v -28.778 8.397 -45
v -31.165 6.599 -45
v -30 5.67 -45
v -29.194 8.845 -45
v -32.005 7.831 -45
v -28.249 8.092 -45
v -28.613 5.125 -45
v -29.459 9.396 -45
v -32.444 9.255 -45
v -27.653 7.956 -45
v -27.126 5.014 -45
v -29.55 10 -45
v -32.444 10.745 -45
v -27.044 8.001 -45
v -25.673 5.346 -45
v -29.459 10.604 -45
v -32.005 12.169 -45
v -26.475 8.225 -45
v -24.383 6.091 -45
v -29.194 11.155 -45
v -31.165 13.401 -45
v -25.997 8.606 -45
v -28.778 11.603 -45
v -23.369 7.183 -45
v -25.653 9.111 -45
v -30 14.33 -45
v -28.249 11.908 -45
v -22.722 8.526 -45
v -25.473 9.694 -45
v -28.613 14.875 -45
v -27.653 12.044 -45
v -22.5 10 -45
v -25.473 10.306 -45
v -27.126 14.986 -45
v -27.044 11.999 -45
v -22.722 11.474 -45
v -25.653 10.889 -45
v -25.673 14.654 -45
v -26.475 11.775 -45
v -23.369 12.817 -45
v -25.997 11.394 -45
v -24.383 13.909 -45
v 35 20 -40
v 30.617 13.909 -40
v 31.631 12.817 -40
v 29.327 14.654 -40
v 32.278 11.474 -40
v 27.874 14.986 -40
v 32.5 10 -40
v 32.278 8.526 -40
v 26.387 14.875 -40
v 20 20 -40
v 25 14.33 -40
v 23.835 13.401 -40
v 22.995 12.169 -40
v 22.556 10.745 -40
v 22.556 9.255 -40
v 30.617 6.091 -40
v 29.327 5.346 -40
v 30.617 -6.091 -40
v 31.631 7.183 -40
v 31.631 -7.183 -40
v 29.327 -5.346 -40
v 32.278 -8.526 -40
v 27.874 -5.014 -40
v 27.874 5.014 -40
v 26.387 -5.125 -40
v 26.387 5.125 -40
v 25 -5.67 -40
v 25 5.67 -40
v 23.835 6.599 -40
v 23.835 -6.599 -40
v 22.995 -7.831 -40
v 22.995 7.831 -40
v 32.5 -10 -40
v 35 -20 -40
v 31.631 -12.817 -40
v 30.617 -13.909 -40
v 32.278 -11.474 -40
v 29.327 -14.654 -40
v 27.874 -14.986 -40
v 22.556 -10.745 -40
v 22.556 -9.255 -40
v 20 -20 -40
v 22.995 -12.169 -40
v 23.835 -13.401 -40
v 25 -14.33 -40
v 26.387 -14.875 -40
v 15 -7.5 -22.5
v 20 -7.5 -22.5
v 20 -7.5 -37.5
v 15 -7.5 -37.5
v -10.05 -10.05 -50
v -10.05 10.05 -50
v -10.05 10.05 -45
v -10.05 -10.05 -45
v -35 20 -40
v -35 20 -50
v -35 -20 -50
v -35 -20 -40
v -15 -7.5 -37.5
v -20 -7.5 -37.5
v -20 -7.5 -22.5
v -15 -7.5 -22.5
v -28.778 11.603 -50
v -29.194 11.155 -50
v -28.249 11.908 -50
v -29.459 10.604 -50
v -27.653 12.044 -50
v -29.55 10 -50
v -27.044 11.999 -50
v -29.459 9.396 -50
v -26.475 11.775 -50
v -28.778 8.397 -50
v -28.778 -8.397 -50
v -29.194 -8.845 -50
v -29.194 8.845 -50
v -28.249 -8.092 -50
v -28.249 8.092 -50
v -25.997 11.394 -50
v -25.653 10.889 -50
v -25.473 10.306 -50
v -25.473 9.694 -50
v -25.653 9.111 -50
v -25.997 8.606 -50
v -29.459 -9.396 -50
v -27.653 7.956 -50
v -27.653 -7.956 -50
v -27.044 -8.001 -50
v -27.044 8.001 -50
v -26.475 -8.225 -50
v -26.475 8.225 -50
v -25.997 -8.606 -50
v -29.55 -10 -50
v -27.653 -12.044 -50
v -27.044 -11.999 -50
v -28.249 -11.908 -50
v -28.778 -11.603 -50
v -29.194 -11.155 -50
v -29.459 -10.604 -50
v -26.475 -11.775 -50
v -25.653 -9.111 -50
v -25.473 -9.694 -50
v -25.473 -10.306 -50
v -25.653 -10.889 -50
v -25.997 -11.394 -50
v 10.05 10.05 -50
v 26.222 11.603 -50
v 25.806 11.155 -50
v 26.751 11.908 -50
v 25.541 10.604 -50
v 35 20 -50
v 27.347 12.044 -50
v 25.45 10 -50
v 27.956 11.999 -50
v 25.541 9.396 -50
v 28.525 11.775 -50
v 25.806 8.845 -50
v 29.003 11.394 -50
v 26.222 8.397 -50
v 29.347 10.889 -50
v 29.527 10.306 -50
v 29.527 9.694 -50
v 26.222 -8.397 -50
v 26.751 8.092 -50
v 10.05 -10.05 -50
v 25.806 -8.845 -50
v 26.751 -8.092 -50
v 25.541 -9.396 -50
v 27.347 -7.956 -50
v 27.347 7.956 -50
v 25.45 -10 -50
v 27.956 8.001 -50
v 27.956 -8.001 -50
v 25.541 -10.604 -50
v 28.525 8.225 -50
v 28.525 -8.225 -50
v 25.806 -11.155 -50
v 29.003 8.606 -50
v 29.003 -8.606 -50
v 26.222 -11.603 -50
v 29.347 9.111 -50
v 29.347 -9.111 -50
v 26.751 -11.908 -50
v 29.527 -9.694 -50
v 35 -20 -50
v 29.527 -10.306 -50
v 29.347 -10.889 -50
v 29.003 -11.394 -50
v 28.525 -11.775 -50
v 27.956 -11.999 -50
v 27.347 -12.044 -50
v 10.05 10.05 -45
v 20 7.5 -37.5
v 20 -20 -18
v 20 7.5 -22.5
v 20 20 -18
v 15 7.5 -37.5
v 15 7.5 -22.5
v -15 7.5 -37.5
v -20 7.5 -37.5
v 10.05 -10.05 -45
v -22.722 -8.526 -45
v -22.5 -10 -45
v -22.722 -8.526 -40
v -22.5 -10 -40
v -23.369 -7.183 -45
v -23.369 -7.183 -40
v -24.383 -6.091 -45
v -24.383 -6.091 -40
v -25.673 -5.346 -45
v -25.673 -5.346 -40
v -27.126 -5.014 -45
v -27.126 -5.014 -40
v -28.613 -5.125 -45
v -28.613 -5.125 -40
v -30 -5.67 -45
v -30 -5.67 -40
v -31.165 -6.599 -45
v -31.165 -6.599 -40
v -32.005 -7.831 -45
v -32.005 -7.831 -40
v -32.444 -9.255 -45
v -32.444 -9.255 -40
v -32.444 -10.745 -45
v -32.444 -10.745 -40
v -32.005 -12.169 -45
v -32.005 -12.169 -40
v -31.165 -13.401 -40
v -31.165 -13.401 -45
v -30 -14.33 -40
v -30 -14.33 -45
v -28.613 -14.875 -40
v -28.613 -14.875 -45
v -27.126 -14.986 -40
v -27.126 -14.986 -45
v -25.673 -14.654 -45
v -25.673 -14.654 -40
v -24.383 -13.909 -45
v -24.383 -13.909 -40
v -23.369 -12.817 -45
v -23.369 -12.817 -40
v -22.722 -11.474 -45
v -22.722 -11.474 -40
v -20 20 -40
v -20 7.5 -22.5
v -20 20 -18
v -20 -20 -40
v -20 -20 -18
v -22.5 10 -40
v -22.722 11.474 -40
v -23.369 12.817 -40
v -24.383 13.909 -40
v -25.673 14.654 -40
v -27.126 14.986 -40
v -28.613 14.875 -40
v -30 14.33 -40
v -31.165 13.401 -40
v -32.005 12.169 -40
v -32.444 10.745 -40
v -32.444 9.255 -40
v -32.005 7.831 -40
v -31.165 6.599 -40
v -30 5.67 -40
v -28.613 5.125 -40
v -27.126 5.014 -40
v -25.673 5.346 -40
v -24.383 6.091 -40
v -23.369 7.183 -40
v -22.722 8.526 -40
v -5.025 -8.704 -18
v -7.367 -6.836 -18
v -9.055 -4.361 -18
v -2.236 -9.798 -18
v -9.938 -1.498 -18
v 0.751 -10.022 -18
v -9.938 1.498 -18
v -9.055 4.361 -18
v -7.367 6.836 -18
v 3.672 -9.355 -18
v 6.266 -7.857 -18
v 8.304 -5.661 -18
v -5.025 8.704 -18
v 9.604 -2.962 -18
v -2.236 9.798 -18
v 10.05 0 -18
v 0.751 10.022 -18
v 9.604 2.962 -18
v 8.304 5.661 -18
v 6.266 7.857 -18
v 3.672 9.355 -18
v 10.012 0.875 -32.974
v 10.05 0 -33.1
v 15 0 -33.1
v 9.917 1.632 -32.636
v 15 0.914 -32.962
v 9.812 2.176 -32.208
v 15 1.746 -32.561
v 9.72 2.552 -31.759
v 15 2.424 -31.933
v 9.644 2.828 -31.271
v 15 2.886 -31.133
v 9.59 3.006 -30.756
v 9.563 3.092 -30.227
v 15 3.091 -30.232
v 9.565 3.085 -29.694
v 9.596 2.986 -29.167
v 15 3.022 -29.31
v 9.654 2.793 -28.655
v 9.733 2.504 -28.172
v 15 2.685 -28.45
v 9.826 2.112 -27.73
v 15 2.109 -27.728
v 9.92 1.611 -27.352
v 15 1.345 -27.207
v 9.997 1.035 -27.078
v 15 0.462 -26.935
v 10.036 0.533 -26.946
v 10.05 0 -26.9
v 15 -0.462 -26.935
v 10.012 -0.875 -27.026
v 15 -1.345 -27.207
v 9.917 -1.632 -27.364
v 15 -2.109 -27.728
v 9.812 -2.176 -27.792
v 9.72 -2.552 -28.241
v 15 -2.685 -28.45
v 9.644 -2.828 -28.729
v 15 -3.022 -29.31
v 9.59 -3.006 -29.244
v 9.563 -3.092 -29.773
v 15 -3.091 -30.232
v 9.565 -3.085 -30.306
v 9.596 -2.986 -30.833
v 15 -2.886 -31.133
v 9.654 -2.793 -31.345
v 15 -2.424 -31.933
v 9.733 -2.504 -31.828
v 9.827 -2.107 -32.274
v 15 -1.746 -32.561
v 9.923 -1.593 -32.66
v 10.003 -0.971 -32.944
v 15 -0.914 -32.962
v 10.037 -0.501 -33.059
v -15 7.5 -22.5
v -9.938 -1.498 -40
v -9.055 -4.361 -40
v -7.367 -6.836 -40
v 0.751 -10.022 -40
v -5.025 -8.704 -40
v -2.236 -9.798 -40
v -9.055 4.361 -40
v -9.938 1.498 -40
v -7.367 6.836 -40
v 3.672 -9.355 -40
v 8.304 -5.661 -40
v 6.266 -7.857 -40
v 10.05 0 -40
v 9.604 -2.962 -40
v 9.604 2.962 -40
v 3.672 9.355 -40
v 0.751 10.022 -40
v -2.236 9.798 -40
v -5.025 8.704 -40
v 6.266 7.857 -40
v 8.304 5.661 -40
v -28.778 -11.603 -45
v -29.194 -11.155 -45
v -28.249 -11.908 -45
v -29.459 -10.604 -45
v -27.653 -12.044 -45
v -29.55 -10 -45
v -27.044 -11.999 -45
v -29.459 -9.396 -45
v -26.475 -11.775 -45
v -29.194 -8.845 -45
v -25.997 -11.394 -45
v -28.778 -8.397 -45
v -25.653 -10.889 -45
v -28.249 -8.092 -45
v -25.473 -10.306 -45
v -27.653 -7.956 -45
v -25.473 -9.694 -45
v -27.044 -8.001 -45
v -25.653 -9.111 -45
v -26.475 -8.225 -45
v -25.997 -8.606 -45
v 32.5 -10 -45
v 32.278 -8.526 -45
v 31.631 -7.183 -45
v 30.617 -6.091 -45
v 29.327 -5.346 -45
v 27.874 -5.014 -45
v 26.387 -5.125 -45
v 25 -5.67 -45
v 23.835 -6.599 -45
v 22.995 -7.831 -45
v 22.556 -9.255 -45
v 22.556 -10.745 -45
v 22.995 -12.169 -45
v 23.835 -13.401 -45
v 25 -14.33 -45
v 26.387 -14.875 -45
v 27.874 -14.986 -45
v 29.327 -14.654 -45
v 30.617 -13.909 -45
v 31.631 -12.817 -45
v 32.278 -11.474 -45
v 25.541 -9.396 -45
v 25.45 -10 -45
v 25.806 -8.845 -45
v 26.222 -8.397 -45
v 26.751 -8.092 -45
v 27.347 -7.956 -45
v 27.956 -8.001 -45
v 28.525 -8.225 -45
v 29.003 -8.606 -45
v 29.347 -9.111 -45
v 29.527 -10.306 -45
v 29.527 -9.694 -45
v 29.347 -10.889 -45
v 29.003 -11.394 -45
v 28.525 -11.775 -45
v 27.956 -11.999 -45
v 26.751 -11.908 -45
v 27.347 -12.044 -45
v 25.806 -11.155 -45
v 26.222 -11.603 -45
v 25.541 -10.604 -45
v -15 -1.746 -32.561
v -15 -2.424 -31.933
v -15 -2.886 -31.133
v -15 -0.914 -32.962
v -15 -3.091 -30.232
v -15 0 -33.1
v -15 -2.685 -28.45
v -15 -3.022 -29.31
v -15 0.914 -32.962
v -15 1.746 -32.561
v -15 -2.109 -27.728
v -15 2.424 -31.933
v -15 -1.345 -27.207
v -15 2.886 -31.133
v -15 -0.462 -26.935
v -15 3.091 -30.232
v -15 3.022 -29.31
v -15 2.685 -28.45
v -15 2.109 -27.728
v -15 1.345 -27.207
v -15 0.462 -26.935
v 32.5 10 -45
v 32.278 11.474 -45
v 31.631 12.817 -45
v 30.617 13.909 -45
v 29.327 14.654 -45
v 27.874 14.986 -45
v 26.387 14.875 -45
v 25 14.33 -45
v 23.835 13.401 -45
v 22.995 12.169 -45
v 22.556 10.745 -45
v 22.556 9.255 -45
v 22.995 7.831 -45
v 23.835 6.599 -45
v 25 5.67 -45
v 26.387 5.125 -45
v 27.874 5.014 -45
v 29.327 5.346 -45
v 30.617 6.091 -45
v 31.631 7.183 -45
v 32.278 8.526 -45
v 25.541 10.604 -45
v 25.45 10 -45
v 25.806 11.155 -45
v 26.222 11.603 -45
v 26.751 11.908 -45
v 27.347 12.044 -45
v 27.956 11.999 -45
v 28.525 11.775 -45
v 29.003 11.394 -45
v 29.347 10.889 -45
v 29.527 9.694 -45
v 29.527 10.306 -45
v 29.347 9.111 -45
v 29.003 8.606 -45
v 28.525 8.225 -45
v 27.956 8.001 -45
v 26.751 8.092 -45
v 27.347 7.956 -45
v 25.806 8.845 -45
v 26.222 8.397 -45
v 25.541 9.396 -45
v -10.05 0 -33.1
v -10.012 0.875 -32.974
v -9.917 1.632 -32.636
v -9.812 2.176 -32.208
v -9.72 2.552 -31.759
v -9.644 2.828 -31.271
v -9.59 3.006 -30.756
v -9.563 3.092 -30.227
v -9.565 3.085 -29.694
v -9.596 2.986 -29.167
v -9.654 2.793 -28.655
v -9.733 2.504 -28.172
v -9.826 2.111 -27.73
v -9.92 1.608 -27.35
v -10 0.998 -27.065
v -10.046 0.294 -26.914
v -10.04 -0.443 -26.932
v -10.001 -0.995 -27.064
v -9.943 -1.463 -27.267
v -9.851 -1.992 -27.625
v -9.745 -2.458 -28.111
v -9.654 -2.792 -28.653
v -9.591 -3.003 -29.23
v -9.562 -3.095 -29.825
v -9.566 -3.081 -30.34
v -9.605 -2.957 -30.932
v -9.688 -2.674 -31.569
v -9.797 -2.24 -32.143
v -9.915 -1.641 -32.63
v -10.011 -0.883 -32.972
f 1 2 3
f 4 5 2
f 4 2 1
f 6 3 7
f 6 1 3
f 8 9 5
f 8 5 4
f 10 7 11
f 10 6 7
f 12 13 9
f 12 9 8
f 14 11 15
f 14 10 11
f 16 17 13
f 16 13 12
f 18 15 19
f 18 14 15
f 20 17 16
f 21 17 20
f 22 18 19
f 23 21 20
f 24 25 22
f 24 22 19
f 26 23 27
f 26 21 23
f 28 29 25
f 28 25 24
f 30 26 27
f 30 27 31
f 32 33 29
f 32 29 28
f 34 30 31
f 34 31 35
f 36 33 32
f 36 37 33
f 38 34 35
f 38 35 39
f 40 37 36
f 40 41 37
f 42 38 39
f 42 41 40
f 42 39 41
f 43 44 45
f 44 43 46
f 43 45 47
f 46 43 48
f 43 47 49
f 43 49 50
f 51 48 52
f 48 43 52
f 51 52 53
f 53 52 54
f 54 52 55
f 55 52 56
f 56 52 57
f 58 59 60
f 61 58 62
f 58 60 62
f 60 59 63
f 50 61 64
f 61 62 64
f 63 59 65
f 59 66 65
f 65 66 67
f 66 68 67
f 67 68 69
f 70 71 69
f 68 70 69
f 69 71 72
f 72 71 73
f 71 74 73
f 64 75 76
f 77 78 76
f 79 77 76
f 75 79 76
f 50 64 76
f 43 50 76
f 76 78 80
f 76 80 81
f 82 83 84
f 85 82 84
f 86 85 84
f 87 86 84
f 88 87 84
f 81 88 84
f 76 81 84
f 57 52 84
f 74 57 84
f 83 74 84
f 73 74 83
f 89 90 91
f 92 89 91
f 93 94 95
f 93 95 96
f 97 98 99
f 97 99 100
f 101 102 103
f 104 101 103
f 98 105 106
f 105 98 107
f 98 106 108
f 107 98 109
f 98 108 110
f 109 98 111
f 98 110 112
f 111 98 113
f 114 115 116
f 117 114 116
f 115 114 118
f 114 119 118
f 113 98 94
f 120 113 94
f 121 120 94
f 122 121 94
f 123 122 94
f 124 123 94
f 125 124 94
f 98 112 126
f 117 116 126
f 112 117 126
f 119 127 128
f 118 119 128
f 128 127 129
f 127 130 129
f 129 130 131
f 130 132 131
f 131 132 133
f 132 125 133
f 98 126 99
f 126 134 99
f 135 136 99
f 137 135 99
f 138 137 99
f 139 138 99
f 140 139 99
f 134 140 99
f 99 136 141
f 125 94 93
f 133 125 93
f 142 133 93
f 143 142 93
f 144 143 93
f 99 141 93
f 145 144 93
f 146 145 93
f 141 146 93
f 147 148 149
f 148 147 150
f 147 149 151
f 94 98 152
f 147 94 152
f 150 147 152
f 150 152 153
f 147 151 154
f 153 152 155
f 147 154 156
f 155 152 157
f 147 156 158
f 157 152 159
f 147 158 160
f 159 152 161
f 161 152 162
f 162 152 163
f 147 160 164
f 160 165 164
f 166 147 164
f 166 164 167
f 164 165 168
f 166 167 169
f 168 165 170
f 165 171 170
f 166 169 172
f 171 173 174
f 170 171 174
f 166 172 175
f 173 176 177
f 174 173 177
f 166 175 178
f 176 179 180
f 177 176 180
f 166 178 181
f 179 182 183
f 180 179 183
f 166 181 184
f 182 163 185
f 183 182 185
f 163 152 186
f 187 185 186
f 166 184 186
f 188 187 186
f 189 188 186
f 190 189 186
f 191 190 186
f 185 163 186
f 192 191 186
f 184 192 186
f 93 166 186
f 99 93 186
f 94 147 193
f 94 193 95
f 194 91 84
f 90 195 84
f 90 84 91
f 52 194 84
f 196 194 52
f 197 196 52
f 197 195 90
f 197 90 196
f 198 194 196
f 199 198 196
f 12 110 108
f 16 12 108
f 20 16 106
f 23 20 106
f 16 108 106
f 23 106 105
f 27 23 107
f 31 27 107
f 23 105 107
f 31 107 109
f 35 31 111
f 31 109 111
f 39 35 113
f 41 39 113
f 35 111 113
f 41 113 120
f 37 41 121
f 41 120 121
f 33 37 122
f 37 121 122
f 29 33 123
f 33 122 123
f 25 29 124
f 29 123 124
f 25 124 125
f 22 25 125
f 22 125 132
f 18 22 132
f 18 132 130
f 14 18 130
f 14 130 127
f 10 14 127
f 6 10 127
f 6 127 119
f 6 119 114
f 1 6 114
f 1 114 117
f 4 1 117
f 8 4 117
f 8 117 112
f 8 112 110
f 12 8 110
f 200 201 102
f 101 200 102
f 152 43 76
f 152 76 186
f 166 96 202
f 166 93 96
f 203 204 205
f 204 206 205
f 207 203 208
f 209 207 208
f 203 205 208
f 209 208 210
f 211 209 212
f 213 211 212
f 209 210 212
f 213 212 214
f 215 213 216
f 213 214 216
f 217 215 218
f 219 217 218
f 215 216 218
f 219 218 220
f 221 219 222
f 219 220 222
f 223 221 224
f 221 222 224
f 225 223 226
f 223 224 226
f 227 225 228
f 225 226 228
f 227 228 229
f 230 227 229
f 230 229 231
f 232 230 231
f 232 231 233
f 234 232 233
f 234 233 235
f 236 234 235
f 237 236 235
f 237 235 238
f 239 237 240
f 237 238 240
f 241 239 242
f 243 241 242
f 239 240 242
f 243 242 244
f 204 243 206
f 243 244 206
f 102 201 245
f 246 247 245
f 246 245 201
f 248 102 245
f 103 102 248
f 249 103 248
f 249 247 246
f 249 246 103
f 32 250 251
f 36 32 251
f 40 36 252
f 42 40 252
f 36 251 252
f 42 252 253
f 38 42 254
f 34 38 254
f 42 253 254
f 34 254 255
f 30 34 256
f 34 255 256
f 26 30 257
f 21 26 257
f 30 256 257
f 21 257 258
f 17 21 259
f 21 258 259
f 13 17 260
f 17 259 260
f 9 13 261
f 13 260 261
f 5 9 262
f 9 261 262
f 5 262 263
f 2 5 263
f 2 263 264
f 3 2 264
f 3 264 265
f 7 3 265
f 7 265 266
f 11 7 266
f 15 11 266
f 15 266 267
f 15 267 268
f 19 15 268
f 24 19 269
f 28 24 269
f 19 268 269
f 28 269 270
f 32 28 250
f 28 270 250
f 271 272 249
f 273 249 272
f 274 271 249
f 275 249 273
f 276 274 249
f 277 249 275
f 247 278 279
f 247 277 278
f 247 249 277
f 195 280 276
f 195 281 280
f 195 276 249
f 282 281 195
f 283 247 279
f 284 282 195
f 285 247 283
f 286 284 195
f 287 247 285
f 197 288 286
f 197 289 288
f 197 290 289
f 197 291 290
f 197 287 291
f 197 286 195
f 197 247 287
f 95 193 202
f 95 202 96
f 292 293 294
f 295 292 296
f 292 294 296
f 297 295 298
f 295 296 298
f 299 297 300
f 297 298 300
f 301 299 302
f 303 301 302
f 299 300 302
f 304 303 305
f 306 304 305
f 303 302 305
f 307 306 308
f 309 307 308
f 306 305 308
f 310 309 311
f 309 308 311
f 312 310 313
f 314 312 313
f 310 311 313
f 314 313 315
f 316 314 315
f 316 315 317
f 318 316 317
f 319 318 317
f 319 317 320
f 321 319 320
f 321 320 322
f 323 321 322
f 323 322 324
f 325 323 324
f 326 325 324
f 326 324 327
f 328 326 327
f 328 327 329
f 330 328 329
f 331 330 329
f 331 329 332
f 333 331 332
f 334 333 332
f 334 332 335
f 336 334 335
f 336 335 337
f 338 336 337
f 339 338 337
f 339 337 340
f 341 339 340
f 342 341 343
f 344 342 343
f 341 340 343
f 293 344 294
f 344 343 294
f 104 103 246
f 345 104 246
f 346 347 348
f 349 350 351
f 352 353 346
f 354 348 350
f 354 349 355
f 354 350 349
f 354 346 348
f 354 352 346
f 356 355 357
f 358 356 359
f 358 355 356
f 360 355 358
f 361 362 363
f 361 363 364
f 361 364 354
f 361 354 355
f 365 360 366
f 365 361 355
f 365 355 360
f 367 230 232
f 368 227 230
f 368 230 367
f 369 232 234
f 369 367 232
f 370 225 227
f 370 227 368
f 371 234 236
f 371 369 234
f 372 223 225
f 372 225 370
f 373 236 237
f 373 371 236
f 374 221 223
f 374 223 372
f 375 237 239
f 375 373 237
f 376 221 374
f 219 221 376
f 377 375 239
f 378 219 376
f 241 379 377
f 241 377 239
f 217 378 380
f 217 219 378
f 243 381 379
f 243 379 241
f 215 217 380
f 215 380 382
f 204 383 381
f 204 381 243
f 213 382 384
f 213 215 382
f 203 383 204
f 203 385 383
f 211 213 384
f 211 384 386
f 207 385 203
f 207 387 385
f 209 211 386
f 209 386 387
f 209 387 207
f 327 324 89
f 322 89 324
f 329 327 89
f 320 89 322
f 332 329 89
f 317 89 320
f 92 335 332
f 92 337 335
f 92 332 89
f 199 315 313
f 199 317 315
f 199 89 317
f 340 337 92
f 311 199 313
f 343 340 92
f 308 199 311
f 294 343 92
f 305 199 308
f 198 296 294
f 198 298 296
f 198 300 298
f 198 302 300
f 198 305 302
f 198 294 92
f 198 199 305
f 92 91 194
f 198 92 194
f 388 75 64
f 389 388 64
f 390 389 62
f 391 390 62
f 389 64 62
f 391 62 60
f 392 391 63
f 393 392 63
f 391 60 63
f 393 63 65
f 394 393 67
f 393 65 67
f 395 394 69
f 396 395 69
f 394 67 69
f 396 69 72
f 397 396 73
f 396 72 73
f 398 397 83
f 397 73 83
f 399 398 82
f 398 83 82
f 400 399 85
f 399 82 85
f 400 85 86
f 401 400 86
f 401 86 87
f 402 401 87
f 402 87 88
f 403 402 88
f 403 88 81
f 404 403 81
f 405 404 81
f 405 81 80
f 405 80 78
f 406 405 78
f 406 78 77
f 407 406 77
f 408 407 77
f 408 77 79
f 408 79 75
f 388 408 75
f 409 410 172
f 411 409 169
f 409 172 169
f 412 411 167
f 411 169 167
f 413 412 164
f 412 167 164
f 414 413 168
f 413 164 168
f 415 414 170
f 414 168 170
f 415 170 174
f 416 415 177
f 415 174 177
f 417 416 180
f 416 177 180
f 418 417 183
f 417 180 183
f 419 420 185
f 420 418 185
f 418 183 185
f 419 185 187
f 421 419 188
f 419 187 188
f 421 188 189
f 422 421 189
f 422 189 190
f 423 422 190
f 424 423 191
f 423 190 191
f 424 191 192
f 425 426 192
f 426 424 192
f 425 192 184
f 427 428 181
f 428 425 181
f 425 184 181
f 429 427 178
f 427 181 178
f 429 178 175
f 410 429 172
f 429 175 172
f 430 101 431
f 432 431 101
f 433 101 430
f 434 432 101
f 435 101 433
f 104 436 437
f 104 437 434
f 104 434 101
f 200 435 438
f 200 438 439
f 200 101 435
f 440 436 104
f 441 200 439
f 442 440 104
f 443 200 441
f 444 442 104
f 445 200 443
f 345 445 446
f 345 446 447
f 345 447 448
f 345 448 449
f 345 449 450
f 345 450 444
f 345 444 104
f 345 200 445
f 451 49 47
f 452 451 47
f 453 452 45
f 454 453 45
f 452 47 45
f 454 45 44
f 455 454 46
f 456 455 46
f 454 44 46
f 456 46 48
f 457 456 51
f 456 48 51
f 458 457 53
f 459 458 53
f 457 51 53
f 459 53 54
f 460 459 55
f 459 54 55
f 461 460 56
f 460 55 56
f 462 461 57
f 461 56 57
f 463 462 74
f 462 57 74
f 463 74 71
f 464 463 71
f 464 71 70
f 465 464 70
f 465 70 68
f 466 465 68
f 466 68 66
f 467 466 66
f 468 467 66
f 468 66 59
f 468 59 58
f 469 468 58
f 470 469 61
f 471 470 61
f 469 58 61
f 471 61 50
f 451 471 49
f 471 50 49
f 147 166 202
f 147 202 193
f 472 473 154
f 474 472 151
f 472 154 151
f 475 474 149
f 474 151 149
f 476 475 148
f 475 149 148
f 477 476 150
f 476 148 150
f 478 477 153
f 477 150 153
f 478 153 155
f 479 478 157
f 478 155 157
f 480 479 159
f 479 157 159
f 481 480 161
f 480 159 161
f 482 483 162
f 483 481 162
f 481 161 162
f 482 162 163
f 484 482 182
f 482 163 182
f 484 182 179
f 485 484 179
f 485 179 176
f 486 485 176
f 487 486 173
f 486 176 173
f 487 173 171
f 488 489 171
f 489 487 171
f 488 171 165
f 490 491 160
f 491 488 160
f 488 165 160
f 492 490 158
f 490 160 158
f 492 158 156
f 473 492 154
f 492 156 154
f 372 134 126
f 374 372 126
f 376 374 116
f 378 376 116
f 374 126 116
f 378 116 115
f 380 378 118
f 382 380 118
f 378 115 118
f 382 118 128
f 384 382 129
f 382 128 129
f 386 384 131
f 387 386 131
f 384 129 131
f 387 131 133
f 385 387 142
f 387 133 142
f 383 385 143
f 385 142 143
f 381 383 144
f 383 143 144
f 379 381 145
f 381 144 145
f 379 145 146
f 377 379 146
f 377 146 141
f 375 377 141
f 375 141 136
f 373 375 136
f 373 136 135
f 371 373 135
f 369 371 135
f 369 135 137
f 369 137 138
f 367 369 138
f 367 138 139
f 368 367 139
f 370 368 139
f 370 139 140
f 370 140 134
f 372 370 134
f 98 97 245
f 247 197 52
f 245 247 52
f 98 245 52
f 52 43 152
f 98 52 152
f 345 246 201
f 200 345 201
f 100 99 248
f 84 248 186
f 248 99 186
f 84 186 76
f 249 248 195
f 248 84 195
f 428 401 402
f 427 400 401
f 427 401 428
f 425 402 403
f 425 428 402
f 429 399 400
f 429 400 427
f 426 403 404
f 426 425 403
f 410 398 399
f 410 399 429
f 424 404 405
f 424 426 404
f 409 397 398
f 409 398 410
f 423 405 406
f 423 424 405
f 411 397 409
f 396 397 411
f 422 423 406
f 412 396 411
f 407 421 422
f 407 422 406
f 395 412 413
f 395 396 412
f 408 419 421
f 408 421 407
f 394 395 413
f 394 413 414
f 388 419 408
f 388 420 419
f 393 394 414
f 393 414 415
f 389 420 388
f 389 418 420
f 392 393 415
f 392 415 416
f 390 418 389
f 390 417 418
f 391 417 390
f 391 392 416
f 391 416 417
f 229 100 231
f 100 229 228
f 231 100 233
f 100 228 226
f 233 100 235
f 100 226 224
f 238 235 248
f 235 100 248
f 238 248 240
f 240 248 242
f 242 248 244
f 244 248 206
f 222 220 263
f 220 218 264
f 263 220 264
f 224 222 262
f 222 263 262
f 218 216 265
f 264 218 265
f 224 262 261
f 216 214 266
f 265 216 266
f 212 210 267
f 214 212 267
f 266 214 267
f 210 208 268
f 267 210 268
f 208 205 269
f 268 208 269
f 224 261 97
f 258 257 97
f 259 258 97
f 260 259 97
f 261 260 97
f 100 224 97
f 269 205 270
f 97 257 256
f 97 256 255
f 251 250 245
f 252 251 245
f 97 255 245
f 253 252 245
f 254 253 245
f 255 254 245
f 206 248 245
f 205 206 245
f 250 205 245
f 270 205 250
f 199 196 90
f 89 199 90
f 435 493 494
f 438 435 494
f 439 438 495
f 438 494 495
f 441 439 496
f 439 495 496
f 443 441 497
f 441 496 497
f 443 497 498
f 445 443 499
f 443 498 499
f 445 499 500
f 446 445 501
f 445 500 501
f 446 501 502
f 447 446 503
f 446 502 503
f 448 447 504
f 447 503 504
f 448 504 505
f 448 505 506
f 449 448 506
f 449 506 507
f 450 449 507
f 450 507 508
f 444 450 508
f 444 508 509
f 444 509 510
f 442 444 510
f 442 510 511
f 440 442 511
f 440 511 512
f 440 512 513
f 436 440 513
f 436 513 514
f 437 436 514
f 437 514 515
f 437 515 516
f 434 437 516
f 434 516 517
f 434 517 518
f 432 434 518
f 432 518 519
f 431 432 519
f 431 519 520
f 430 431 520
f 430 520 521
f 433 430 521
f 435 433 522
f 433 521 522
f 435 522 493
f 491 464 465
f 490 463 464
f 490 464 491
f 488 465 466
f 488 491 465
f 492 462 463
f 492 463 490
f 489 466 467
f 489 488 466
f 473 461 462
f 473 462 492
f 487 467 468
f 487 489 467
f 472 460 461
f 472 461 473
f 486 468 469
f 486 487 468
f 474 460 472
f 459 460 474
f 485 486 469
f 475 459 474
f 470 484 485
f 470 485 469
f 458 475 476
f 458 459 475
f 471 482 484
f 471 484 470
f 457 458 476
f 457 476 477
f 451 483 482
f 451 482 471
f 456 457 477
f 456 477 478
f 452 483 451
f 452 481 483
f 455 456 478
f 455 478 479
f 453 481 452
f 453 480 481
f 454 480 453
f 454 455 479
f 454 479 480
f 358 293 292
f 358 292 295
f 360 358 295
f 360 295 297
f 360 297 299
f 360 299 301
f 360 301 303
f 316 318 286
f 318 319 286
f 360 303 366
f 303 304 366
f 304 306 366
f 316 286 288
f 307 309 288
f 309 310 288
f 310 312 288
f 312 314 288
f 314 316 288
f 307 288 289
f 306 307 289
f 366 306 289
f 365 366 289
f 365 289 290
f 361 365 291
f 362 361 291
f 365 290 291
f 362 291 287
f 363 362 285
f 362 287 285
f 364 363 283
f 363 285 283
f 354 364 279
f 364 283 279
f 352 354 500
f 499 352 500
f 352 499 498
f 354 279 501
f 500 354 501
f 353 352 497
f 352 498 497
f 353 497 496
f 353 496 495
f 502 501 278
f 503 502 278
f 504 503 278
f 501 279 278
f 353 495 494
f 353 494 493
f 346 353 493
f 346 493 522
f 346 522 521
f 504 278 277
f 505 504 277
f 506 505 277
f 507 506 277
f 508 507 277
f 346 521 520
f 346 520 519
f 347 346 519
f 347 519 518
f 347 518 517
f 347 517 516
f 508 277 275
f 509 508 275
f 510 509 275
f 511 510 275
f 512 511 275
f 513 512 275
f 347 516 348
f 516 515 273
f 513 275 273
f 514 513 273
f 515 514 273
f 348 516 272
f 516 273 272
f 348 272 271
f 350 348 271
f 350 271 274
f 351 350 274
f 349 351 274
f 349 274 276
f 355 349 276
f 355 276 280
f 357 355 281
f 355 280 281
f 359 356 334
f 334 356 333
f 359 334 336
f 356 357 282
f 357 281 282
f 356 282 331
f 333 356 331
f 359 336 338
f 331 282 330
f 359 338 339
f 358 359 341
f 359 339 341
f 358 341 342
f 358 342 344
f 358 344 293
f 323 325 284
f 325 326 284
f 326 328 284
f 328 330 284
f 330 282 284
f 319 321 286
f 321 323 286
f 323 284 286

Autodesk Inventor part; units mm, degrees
ref_plane "YZ Plane" through (0, 0, 0) normal (1, 0, 0) x (0, 1, 0)
ref_plane "XZ Plane" through (0, 0, 0) normal (0, 1, 0) x (-1, 0, 0)
ref_plane "XY Plane" through (0, 0, 0) normal (0, 0, 1) x (1, 0, 0)
sketch "Sketch5" plane through (0, 0, 0) normal (0, 0, 1) x (1, 0, 0)
  line L0 (-20, -20) -> (20, -20)
  line L1 (20, -20) -> (20, 20)
  line L2 (20, 20) -> (-20, 20)
  line L3 (-20, 20) -> (-20, -20)
  line L4 (-20, -20) -> (20, 20) construction
  line L5 (20, -20) -> (-20, 20) construction
  point P0 (0, 0)
  dimension "d13" = 40
  dimension "d14" = 40
extrude "Extrusion5" add sketch "Sketch5" against normal blind 50
sketch "Sketch6" plane through (0, 0, 0) normal (0, 0, 1) x (1, 0, 0)
  circle A0 centre (0, 0) radius 10.05
  dimension "d17" = 20.1
extrude "Extrusion6" cut sketch "Sketch6" against normal blind 40
sketch "Sketch9" plane through (0, 0, -50) normal (0, 0, -1) x (-1, 0, 0)
  line L0 (-10.05, 10.05) -> (10.05, 10.05)
  line L1 (10.05, 10.05) -> (10.05, -10.05)
  line L2 (10.05, -10.05) -> (-10.05, -10.05)
  line L3 (-10.05, -10.05) -> (-10.05, 10.05)
  line L4 (-10.05, 10.05) -> (10.05, -10.05) construction
  line L5 (10.05, 10.05) -> (-10.05, -10.05) construction
  point P0 (0, 0)
  dimension "d28" = 20.1
  dimension "d29" = 20.1
extrude "Extrusion9" cut sketch "Sketch9" against normal blind 5
sketch "Sketch10" plane through (20, -20, 0) normal (1, 0, 0) x (0, 0, -1)
  line L0 (40, 0) -> (50, 0)
  line L1 (50, 0) -> (50, 40)
  line L2 (50, 40) -> (40, 40)
  line L3 (40, 40) -> (40, 0)
  line L4 (40, 0) -> (50, 40) construction
  line L5 (50, 0) -> (40, 40) construction
  line L6 (50, 40) -> (50, 0) projected
  line L7 (0, 40) -> (50, 40) projected
  line L8 (0, 0) -> (50, 0) projected
  point P0 (0, 20)
  point P1 (45, 20)
  dimension "d32" = 10
extrude "Extrusion10" add sketch "Sketch10" along normal blind 15
mirror "Mirror2" about plane through (0, 0, 0) normal (1, 0, 0) of "Extrusion10"
sketch "Sketch11" plane through (0, 0, -50) normal (0, 0, -1) x (-1, 0, 0)
  circle A0 centre (-27.5, 10) radius 2.05
  line L0 (-35, 20) -> (35, 20) projected
  line L1 (-35, -20) -> (-35, 20) projected
  circle A1 centre (-27.5, -10) radius 2.05
  circle A2 centre (27.5, -10) radius 2.05
  circle A3 centre (27.5, 10) radius 2.05
  line L2 (35, -20) -> (-35, -20) projected
  line L3 (35, -20) -> (35, 20) projected
  point P0 (0, 0)
  dimension "d35" = 4.1
  dimension "d36" = 10
  dimension "d37" = 7.5
  dimension "d38" = 4.1
  dimension "d39" = 4.1
  dimension "d41" = 4.1
  dimension "d42" = 10
  dimension "d43" = 7.5
  dimension "d44" = 7.5
  dimension "d45" = 7.5
  dimension "d46" = 10
  dimension "d47" = 10
extrude "Extrusion11" cut sketch "Sketch11" against normal through all contours A0 | A1 | A2 | A3
sketch "Sketch12" plane through (20, -20, -40) normal (0, 0, 1) x (1, 0, 0)
  circle A0 centre (7.5, 30) radius 2.05 projected
  circle A1 centre (7.5, 10) radius 2.05 projected
  circle A2 centre (-47.5, 10) radius 2.05 projected
  circle A3 centre (-47.5, 30) radius 2.05 projected
  circle A4 centre (7.5, 30) radius 5
  circle A5 centre (7.5, 10) radius 5
  circle A6 centre (-47.5, 30) radius 5
  circle A7 centre (-47.5, 10) radius 5
  point P0 (-20, 20)
  dimension "d50" = 10
  dimension "d51" = 10
  dimension "d52" = 10
  dimension "d53" = 10
extrude "Extrusion12" cut sketch "Sketch12" against normal blind 5
sketch "Sketch13" plane through (20, -20, 0) normal (1, 0, 0) x (0, 0, -1)
  circle A0 centre (30, 20) radius 3.1
  line L0 (40, 40) -> (40, 0) projected
  point P0 (0, 20)
  point P1 (40, 20)
  dimension "d56" = 6.2
  dimension "d57" = 10
extrude "Extrusion13" cut sketch "Sketch13" against normal through all
sketch "Sketch14" plane through (20, -20, 0) normal (1, 0, 0) x (0, 0, -1)
  line L0 (37.5, 27.5) -> (22.5, 27.5)
  line L1 (22.5, 27.5) -> (22.5, 12.5)
  line L2 (22.5, 12.5) -> (37.5, 12.5)
  line L3 (37.5, 12.5) -> (37.5, 27.5)
  line L4 (37.5, 27.5) -> (22.5, 12.5) construction
  line L5 (22.5, 27.5) -> (37.5, 12.5) construction
  line L6 (40, 0) -> (40, 40) projected
  circle A0 centre (30, 20) radius 3.1 projected
  point P0 (0, 20)
  dimension "d60" = 15
  dimension "d61" = 15
extrude "Extrusion14" cut sketch "Sketch14" against normal blind 5 contours L3 L2 L1 L0 | A0
mirror "Mirror3" about plane through (0, 0, 0) normal (1, 0, 0) of "Extrusion14"
sketch "Sketch15" plane through (0, 0, 0) normal (0, 0, 1) x (1, 0, 0)
  line L0 (-20, -20) -> (20, -20)
  line L1 (20, -20) -> (20, 20)
  line L2 (20, 20) -> (-20, 20)
  line L3 (-20, 20) -> (-20, -20)
  line L4 (-20, -20) -> (20, 20) construction
  line L5 (20, -20) -> (-20, 20) construction
  circle A0 centre (0, 0) radius 10.05 projected
  circle A1 centre (0, 0) radius 10.05
  line L6 (20, 20) -> (-20, 20) projected
  line L7 (-20, 20) -> (-20, -20) projected
  line L8 (-20, -20) -> (20, -20) projected
  line L9 (20, -20) -> (20, 20) projected
extrude "Extrusion15" cut sketch "Sketch15" against normal blind 18
properties part number "linear_bracket" material "ABS Plastic"
